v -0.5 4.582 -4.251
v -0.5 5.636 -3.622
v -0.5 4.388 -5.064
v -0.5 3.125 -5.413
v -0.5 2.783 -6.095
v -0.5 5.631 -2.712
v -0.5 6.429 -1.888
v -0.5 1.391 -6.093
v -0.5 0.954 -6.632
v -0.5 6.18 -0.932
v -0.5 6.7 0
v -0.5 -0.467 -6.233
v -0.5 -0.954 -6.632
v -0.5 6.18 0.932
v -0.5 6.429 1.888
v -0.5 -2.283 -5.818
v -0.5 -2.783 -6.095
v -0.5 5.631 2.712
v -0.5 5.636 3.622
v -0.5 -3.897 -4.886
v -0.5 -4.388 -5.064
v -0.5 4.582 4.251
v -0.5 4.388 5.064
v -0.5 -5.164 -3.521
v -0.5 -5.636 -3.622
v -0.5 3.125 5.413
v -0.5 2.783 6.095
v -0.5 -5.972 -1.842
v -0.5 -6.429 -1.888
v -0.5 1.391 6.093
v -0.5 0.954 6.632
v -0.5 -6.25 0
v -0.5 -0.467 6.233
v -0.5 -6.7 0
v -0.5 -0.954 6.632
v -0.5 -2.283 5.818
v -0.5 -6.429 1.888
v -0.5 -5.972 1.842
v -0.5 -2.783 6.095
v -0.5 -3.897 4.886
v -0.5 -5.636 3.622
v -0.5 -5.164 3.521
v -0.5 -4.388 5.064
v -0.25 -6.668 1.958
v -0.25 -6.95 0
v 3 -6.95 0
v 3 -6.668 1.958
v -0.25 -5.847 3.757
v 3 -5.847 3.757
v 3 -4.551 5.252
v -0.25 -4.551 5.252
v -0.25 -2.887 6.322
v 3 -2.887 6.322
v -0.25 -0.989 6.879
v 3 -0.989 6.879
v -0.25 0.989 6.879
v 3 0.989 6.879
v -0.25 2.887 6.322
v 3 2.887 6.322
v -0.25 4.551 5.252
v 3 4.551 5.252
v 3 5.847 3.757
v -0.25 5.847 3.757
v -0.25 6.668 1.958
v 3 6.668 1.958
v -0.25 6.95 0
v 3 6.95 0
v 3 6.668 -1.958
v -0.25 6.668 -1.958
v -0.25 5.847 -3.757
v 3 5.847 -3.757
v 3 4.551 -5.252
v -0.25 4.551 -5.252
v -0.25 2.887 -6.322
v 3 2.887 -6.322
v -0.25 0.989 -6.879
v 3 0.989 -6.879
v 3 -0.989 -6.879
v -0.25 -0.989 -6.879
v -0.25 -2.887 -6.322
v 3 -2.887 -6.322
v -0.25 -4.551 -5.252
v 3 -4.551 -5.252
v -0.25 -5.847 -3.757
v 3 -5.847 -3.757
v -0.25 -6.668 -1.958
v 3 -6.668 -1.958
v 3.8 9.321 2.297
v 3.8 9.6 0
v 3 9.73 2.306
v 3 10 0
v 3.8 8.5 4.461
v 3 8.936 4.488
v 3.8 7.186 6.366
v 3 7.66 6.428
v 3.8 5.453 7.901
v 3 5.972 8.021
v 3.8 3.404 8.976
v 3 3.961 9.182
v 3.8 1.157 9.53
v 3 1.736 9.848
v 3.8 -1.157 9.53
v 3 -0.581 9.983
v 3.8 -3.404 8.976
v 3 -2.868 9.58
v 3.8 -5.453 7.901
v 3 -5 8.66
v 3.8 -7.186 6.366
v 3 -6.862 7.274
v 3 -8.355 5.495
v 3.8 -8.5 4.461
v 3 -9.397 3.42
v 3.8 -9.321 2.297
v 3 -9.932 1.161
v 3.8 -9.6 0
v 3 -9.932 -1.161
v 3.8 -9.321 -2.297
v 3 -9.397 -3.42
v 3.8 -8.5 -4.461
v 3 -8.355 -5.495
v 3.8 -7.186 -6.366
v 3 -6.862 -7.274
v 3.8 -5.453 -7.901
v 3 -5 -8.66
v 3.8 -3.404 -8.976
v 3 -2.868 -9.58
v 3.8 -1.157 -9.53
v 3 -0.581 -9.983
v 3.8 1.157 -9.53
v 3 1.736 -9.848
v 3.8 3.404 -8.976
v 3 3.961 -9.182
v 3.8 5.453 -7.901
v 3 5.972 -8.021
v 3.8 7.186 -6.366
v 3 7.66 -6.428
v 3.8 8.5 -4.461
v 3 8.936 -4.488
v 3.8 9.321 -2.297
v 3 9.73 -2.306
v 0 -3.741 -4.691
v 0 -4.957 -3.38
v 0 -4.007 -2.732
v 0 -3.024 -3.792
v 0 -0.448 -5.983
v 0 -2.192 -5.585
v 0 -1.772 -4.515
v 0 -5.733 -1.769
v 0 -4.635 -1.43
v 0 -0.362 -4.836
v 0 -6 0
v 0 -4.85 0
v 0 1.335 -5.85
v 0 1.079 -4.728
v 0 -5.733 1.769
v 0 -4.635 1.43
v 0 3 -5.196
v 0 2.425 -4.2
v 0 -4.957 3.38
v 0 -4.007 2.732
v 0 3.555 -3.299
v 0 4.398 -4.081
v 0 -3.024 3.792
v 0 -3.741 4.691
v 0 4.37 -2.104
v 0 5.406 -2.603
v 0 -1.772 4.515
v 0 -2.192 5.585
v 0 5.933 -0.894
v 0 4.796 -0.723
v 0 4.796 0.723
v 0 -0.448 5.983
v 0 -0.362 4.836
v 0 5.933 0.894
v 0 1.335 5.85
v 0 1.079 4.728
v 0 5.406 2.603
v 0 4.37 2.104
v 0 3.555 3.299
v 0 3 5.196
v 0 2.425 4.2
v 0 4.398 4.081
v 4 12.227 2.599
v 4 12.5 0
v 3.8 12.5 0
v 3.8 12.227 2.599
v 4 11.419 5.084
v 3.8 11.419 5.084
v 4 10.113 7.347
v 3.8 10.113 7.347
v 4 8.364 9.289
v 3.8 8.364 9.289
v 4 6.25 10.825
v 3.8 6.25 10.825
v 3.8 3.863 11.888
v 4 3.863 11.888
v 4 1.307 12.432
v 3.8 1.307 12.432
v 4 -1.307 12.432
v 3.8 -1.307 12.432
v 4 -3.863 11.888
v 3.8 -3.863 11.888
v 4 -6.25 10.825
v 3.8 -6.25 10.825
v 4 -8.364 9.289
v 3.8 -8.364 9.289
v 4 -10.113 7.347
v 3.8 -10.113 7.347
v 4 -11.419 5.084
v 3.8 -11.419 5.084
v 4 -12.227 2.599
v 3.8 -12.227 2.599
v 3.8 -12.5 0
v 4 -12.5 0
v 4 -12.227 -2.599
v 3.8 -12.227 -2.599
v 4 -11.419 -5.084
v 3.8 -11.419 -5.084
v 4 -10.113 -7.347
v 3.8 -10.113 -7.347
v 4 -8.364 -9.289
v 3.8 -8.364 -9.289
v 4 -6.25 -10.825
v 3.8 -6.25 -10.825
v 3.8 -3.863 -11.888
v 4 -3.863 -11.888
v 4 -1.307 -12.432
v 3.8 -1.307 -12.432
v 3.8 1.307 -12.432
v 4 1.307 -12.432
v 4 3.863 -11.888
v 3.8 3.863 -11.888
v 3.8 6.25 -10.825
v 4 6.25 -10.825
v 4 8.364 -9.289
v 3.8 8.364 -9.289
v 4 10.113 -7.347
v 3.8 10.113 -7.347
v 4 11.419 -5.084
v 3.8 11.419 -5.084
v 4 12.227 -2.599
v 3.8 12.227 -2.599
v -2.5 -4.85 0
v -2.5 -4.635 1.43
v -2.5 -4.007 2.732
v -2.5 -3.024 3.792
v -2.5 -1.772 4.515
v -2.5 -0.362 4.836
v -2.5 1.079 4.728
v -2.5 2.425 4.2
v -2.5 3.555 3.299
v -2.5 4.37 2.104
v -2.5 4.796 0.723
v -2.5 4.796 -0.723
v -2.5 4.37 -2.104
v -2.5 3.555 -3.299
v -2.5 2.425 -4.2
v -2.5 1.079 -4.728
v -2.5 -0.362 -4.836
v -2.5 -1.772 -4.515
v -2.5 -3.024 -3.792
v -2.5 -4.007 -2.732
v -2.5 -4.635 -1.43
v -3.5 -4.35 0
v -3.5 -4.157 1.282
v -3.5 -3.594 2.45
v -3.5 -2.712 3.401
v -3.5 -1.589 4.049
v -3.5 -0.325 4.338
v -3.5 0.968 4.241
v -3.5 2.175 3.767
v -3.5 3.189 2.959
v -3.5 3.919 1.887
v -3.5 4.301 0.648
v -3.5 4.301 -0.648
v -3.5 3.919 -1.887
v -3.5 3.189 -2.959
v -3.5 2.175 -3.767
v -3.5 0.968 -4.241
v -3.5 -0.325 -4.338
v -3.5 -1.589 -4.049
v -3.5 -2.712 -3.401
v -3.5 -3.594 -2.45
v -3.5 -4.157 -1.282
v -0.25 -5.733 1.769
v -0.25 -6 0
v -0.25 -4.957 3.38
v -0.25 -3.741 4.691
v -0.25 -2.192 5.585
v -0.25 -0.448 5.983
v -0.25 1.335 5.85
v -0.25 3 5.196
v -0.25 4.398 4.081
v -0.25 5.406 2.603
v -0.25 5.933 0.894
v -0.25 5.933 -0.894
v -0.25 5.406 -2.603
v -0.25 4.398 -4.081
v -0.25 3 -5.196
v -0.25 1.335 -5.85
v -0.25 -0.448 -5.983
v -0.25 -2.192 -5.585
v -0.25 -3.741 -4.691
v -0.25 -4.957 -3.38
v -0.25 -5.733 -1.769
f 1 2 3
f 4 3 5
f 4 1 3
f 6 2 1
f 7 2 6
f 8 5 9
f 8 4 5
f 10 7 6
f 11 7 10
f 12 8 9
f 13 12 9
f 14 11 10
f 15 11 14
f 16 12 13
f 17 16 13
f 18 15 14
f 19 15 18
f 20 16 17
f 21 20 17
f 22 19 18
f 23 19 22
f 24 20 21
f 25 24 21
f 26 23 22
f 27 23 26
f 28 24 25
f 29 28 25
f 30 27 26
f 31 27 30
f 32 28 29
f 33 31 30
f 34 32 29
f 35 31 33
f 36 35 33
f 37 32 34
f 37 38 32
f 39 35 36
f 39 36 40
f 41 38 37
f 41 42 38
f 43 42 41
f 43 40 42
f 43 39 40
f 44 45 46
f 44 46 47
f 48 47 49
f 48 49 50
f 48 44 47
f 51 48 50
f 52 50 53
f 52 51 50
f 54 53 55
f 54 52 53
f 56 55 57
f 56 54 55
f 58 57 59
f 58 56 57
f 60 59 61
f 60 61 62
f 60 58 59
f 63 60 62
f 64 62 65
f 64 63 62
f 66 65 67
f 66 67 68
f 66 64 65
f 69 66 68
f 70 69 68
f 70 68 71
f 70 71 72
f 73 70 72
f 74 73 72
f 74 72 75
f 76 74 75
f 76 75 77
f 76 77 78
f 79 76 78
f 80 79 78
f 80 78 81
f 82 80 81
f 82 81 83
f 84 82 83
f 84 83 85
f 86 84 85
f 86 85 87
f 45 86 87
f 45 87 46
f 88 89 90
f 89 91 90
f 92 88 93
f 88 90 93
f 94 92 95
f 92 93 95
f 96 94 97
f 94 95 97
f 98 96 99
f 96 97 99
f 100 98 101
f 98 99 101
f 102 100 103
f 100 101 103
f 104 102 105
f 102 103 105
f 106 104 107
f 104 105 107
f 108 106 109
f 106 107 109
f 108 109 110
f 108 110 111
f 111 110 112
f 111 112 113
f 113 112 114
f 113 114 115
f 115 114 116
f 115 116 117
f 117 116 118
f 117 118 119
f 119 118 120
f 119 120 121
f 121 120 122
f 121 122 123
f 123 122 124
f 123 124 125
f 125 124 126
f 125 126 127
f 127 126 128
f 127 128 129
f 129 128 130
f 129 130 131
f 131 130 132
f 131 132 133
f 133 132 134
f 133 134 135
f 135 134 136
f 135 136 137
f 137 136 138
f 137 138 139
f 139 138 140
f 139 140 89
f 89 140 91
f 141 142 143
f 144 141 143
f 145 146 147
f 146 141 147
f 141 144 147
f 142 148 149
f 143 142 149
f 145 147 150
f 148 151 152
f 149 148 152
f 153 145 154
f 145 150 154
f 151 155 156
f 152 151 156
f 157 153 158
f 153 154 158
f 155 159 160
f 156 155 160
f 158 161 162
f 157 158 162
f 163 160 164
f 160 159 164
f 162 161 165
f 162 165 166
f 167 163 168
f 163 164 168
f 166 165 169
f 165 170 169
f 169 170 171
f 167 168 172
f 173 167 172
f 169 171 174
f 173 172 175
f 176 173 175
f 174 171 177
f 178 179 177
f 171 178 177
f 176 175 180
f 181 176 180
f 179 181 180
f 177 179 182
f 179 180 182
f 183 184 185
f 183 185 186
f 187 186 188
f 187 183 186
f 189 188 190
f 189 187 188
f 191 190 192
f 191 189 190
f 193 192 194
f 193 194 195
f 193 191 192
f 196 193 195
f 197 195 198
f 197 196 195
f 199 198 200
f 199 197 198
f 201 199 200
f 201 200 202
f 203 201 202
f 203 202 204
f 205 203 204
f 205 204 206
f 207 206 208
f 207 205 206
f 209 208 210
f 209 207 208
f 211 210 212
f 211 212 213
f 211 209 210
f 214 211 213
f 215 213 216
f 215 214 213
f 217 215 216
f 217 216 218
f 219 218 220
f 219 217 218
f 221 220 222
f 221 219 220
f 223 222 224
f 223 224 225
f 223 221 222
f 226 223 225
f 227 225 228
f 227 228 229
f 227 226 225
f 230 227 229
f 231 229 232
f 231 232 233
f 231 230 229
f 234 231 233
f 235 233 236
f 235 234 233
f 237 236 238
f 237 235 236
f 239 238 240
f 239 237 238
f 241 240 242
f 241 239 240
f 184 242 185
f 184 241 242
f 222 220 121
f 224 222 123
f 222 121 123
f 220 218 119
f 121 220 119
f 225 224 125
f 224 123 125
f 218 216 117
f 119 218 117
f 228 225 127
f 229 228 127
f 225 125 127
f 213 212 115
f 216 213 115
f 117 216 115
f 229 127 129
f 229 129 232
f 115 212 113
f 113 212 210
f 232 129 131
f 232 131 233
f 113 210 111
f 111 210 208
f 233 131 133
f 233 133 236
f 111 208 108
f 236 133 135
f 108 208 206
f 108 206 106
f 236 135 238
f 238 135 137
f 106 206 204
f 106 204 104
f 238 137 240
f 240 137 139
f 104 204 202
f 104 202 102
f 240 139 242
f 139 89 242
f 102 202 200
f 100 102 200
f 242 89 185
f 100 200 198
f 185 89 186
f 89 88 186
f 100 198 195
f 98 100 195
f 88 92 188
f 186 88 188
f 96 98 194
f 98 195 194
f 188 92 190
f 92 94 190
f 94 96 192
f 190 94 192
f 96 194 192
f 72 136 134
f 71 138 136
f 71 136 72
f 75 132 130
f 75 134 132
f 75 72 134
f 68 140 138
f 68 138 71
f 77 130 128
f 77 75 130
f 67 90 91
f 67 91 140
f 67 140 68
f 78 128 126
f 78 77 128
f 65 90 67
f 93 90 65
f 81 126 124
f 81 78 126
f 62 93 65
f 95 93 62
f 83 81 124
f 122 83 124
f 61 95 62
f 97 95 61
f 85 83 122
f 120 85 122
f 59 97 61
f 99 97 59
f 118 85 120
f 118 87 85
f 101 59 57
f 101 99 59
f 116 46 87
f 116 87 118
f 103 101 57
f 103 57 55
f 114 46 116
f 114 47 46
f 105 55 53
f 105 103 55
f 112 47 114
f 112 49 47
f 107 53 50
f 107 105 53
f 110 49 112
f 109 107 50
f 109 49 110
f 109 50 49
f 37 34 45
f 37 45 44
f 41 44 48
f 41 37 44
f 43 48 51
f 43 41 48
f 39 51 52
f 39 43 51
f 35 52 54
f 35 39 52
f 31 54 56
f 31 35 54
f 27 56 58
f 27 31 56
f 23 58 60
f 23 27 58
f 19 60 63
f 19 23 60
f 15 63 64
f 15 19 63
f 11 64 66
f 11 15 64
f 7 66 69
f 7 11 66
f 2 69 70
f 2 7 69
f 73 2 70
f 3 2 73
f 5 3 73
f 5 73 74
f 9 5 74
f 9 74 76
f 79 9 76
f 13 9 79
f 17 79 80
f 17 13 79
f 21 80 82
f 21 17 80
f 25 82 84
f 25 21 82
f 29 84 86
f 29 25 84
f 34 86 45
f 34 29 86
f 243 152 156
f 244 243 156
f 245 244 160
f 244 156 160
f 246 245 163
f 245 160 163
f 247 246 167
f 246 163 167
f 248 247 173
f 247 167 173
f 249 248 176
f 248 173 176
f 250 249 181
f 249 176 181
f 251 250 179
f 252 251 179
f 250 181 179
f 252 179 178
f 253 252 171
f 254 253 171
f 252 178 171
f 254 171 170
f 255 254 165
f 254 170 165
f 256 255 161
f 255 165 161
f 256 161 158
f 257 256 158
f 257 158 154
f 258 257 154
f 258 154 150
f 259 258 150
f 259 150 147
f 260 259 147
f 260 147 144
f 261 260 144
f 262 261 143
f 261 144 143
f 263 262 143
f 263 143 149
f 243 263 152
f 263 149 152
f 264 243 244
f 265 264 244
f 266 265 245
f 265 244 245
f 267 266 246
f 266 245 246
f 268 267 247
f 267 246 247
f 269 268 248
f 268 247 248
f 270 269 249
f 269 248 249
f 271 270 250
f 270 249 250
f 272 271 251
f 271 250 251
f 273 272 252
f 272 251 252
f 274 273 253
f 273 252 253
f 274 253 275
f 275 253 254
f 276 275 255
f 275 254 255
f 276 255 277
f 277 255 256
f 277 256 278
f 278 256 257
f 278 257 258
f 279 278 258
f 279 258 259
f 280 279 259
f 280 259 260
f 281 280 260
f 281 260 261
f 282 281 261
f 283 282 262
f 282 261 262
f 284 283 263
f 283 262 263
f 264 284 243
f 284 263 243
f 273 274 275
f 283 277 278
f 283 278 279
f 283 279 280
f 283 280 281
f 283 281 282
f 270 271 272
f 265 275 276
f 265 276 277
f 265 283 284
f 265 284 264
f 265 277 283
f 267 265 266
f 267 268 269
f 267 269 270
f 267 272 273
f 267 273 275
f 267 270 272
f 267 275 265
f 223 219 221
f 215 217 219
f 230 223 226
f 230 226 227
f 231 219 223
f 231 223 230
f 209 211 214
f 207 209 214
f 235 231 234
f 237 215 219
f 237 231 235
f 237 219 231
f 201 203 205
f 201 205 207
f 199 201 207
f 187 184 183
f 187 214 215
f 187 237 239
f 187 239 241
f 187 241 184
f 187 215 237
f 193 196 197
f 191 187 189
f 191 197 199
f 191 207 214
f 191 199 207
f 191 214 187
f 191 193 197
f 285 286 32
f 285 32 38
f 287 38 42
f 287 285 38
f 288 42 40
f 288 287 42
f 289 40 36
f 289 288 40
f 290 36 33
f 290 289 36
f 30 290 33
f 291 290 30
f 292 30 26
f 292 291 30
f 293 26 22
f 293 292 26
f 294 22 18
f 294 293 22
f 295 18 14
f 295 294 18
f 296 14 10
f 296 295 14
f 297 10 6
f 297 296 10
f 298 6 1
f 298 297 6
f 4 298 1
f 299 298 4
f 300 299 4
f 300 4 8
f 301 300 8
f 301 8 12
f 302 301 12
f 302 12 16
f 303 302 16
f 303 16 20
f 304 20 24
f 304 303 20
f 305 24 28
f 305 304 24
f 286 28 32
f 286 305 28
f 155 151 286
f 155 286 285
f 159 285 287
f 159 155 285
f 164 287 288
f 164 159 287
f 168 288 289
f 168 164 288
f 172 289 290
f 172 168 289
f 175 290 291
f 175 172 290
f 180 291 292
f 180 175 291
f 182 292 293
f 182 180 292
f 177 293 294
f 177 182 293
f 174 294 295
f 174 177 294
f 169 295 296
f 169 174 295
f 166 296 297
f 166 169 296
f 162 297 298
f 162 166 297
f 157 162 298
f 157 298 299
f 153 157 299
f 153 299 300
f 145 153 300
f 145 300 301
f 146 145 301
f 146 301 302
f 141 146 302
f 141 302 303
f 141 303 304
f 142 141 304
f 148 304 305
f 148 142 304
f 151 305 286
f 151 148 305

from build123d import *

# Parameters (mm, degrees)
F0_R       = 10
F1_DEPTH   = 4
F2_R       = 4.85
F3_DEPTH   = 3.5
F4_R       = 6.95
F4_R_2     = 6
F5_DEPTH   = 0.5
F6_R       = 10
F6_R_2     = 6.95
F7_DEPTH   = 3
F8_SIZE    = 0.25
F9_SIZE2   = 0.99999
F9_SIZE    = 0.49999
F9_2_SIZE2 = 1
F9_2_SIZE  = 0.5
F10_R      = 12.5
F10_R_2    = 9.5
F11_DEPTH  = 0.2


# Not quite as in the source:
# - a fillet or chamfer is up to 0.001 mm smaller than in the source, because OpenCascade refuses the exact size


with BuildPart() as f1:
    # F0 (on Right) → F1 (new body)
    with BuildSketch(Plane.YZ):
        Circle(F0_R)
    extrude(amount=F1_DEPTH)

    # F2 (on face) → F3 (join)
    with BuildSketch(Plane(origin=(0, 0, 0), x_dir=(0, -1, 0), z_dir=(-1, 0, 0))):
        Circle(F2_R)
    extrude(amount=F3_DEPTH)

    # F4 (on face) → F5 (join)
    with BuildSketch(Plane(origin=(0, 0, 0), x_dir=(0, -1, 0), z_dir=(-1, 0, 0))):
        Circle(F4_R)
        Circle(F4_R_2, mode=Mode.SUBTRACT)
    extrude(amount=F5_DEPTH)

    # F6 (on face) → F7 (cut)
    with BuildSketch(Plane(origin=(0, 0, 0), x_dir=(0, -1, 0), z_dir=(-1, 0, 0))):
        Circle(F6_R)
        Circle(F6_R_2, mode=Mode.SUBTRACT)
    extrude(amount=-F7_DEPTH, mode=Mode.SUBTRACT)

    # F8
    f8_edges = [f1.edges().sort_by_distance(p)[0] for p in [
        (-0.5, 6.95, 0),
        (-0.5, 6, 0),
    ]]
    chamfer(f8_edges, length=F8_SIZE)

    # F9 (size 0.5 and 1 in the source; OpenCascade refuses exactly that, so slightly less here)
    f9_edges = [f1.edges().sort_by_distance(p)[0] for p in [
        (4, -10, 0),
    ]]
    f9_side = f1.faces().sort_by_distance((4, 0, 0))[0]
    chamfer(f9_edges, length=F9_SIZE, length2=F9_SIZE2, reference=f9_side)

    # F9#2
    f9_2_edges = [f1.edges().sort_by_distance(p)[0] for p in [
        (-3.5, 4.85, 0),
    ]]
    f9_2_side = f1.faces().sort_by_distance((-3.5, 0, 0))[0]
    chamfer(f9_2_edges, length=F9_2_SIZE, length2=F9_2_SIZE2, reference=f9_2_side)

    # F10 (on face) → F11 (join)
    with BuildSketch(Plane.YZ.offset(4)):
        Circle(F10_R)
        Circle(F10_R_2, mode=Mode.SUBTRACT)
    extrude(amount=-F11_DEPTH)


solid = f1.part
